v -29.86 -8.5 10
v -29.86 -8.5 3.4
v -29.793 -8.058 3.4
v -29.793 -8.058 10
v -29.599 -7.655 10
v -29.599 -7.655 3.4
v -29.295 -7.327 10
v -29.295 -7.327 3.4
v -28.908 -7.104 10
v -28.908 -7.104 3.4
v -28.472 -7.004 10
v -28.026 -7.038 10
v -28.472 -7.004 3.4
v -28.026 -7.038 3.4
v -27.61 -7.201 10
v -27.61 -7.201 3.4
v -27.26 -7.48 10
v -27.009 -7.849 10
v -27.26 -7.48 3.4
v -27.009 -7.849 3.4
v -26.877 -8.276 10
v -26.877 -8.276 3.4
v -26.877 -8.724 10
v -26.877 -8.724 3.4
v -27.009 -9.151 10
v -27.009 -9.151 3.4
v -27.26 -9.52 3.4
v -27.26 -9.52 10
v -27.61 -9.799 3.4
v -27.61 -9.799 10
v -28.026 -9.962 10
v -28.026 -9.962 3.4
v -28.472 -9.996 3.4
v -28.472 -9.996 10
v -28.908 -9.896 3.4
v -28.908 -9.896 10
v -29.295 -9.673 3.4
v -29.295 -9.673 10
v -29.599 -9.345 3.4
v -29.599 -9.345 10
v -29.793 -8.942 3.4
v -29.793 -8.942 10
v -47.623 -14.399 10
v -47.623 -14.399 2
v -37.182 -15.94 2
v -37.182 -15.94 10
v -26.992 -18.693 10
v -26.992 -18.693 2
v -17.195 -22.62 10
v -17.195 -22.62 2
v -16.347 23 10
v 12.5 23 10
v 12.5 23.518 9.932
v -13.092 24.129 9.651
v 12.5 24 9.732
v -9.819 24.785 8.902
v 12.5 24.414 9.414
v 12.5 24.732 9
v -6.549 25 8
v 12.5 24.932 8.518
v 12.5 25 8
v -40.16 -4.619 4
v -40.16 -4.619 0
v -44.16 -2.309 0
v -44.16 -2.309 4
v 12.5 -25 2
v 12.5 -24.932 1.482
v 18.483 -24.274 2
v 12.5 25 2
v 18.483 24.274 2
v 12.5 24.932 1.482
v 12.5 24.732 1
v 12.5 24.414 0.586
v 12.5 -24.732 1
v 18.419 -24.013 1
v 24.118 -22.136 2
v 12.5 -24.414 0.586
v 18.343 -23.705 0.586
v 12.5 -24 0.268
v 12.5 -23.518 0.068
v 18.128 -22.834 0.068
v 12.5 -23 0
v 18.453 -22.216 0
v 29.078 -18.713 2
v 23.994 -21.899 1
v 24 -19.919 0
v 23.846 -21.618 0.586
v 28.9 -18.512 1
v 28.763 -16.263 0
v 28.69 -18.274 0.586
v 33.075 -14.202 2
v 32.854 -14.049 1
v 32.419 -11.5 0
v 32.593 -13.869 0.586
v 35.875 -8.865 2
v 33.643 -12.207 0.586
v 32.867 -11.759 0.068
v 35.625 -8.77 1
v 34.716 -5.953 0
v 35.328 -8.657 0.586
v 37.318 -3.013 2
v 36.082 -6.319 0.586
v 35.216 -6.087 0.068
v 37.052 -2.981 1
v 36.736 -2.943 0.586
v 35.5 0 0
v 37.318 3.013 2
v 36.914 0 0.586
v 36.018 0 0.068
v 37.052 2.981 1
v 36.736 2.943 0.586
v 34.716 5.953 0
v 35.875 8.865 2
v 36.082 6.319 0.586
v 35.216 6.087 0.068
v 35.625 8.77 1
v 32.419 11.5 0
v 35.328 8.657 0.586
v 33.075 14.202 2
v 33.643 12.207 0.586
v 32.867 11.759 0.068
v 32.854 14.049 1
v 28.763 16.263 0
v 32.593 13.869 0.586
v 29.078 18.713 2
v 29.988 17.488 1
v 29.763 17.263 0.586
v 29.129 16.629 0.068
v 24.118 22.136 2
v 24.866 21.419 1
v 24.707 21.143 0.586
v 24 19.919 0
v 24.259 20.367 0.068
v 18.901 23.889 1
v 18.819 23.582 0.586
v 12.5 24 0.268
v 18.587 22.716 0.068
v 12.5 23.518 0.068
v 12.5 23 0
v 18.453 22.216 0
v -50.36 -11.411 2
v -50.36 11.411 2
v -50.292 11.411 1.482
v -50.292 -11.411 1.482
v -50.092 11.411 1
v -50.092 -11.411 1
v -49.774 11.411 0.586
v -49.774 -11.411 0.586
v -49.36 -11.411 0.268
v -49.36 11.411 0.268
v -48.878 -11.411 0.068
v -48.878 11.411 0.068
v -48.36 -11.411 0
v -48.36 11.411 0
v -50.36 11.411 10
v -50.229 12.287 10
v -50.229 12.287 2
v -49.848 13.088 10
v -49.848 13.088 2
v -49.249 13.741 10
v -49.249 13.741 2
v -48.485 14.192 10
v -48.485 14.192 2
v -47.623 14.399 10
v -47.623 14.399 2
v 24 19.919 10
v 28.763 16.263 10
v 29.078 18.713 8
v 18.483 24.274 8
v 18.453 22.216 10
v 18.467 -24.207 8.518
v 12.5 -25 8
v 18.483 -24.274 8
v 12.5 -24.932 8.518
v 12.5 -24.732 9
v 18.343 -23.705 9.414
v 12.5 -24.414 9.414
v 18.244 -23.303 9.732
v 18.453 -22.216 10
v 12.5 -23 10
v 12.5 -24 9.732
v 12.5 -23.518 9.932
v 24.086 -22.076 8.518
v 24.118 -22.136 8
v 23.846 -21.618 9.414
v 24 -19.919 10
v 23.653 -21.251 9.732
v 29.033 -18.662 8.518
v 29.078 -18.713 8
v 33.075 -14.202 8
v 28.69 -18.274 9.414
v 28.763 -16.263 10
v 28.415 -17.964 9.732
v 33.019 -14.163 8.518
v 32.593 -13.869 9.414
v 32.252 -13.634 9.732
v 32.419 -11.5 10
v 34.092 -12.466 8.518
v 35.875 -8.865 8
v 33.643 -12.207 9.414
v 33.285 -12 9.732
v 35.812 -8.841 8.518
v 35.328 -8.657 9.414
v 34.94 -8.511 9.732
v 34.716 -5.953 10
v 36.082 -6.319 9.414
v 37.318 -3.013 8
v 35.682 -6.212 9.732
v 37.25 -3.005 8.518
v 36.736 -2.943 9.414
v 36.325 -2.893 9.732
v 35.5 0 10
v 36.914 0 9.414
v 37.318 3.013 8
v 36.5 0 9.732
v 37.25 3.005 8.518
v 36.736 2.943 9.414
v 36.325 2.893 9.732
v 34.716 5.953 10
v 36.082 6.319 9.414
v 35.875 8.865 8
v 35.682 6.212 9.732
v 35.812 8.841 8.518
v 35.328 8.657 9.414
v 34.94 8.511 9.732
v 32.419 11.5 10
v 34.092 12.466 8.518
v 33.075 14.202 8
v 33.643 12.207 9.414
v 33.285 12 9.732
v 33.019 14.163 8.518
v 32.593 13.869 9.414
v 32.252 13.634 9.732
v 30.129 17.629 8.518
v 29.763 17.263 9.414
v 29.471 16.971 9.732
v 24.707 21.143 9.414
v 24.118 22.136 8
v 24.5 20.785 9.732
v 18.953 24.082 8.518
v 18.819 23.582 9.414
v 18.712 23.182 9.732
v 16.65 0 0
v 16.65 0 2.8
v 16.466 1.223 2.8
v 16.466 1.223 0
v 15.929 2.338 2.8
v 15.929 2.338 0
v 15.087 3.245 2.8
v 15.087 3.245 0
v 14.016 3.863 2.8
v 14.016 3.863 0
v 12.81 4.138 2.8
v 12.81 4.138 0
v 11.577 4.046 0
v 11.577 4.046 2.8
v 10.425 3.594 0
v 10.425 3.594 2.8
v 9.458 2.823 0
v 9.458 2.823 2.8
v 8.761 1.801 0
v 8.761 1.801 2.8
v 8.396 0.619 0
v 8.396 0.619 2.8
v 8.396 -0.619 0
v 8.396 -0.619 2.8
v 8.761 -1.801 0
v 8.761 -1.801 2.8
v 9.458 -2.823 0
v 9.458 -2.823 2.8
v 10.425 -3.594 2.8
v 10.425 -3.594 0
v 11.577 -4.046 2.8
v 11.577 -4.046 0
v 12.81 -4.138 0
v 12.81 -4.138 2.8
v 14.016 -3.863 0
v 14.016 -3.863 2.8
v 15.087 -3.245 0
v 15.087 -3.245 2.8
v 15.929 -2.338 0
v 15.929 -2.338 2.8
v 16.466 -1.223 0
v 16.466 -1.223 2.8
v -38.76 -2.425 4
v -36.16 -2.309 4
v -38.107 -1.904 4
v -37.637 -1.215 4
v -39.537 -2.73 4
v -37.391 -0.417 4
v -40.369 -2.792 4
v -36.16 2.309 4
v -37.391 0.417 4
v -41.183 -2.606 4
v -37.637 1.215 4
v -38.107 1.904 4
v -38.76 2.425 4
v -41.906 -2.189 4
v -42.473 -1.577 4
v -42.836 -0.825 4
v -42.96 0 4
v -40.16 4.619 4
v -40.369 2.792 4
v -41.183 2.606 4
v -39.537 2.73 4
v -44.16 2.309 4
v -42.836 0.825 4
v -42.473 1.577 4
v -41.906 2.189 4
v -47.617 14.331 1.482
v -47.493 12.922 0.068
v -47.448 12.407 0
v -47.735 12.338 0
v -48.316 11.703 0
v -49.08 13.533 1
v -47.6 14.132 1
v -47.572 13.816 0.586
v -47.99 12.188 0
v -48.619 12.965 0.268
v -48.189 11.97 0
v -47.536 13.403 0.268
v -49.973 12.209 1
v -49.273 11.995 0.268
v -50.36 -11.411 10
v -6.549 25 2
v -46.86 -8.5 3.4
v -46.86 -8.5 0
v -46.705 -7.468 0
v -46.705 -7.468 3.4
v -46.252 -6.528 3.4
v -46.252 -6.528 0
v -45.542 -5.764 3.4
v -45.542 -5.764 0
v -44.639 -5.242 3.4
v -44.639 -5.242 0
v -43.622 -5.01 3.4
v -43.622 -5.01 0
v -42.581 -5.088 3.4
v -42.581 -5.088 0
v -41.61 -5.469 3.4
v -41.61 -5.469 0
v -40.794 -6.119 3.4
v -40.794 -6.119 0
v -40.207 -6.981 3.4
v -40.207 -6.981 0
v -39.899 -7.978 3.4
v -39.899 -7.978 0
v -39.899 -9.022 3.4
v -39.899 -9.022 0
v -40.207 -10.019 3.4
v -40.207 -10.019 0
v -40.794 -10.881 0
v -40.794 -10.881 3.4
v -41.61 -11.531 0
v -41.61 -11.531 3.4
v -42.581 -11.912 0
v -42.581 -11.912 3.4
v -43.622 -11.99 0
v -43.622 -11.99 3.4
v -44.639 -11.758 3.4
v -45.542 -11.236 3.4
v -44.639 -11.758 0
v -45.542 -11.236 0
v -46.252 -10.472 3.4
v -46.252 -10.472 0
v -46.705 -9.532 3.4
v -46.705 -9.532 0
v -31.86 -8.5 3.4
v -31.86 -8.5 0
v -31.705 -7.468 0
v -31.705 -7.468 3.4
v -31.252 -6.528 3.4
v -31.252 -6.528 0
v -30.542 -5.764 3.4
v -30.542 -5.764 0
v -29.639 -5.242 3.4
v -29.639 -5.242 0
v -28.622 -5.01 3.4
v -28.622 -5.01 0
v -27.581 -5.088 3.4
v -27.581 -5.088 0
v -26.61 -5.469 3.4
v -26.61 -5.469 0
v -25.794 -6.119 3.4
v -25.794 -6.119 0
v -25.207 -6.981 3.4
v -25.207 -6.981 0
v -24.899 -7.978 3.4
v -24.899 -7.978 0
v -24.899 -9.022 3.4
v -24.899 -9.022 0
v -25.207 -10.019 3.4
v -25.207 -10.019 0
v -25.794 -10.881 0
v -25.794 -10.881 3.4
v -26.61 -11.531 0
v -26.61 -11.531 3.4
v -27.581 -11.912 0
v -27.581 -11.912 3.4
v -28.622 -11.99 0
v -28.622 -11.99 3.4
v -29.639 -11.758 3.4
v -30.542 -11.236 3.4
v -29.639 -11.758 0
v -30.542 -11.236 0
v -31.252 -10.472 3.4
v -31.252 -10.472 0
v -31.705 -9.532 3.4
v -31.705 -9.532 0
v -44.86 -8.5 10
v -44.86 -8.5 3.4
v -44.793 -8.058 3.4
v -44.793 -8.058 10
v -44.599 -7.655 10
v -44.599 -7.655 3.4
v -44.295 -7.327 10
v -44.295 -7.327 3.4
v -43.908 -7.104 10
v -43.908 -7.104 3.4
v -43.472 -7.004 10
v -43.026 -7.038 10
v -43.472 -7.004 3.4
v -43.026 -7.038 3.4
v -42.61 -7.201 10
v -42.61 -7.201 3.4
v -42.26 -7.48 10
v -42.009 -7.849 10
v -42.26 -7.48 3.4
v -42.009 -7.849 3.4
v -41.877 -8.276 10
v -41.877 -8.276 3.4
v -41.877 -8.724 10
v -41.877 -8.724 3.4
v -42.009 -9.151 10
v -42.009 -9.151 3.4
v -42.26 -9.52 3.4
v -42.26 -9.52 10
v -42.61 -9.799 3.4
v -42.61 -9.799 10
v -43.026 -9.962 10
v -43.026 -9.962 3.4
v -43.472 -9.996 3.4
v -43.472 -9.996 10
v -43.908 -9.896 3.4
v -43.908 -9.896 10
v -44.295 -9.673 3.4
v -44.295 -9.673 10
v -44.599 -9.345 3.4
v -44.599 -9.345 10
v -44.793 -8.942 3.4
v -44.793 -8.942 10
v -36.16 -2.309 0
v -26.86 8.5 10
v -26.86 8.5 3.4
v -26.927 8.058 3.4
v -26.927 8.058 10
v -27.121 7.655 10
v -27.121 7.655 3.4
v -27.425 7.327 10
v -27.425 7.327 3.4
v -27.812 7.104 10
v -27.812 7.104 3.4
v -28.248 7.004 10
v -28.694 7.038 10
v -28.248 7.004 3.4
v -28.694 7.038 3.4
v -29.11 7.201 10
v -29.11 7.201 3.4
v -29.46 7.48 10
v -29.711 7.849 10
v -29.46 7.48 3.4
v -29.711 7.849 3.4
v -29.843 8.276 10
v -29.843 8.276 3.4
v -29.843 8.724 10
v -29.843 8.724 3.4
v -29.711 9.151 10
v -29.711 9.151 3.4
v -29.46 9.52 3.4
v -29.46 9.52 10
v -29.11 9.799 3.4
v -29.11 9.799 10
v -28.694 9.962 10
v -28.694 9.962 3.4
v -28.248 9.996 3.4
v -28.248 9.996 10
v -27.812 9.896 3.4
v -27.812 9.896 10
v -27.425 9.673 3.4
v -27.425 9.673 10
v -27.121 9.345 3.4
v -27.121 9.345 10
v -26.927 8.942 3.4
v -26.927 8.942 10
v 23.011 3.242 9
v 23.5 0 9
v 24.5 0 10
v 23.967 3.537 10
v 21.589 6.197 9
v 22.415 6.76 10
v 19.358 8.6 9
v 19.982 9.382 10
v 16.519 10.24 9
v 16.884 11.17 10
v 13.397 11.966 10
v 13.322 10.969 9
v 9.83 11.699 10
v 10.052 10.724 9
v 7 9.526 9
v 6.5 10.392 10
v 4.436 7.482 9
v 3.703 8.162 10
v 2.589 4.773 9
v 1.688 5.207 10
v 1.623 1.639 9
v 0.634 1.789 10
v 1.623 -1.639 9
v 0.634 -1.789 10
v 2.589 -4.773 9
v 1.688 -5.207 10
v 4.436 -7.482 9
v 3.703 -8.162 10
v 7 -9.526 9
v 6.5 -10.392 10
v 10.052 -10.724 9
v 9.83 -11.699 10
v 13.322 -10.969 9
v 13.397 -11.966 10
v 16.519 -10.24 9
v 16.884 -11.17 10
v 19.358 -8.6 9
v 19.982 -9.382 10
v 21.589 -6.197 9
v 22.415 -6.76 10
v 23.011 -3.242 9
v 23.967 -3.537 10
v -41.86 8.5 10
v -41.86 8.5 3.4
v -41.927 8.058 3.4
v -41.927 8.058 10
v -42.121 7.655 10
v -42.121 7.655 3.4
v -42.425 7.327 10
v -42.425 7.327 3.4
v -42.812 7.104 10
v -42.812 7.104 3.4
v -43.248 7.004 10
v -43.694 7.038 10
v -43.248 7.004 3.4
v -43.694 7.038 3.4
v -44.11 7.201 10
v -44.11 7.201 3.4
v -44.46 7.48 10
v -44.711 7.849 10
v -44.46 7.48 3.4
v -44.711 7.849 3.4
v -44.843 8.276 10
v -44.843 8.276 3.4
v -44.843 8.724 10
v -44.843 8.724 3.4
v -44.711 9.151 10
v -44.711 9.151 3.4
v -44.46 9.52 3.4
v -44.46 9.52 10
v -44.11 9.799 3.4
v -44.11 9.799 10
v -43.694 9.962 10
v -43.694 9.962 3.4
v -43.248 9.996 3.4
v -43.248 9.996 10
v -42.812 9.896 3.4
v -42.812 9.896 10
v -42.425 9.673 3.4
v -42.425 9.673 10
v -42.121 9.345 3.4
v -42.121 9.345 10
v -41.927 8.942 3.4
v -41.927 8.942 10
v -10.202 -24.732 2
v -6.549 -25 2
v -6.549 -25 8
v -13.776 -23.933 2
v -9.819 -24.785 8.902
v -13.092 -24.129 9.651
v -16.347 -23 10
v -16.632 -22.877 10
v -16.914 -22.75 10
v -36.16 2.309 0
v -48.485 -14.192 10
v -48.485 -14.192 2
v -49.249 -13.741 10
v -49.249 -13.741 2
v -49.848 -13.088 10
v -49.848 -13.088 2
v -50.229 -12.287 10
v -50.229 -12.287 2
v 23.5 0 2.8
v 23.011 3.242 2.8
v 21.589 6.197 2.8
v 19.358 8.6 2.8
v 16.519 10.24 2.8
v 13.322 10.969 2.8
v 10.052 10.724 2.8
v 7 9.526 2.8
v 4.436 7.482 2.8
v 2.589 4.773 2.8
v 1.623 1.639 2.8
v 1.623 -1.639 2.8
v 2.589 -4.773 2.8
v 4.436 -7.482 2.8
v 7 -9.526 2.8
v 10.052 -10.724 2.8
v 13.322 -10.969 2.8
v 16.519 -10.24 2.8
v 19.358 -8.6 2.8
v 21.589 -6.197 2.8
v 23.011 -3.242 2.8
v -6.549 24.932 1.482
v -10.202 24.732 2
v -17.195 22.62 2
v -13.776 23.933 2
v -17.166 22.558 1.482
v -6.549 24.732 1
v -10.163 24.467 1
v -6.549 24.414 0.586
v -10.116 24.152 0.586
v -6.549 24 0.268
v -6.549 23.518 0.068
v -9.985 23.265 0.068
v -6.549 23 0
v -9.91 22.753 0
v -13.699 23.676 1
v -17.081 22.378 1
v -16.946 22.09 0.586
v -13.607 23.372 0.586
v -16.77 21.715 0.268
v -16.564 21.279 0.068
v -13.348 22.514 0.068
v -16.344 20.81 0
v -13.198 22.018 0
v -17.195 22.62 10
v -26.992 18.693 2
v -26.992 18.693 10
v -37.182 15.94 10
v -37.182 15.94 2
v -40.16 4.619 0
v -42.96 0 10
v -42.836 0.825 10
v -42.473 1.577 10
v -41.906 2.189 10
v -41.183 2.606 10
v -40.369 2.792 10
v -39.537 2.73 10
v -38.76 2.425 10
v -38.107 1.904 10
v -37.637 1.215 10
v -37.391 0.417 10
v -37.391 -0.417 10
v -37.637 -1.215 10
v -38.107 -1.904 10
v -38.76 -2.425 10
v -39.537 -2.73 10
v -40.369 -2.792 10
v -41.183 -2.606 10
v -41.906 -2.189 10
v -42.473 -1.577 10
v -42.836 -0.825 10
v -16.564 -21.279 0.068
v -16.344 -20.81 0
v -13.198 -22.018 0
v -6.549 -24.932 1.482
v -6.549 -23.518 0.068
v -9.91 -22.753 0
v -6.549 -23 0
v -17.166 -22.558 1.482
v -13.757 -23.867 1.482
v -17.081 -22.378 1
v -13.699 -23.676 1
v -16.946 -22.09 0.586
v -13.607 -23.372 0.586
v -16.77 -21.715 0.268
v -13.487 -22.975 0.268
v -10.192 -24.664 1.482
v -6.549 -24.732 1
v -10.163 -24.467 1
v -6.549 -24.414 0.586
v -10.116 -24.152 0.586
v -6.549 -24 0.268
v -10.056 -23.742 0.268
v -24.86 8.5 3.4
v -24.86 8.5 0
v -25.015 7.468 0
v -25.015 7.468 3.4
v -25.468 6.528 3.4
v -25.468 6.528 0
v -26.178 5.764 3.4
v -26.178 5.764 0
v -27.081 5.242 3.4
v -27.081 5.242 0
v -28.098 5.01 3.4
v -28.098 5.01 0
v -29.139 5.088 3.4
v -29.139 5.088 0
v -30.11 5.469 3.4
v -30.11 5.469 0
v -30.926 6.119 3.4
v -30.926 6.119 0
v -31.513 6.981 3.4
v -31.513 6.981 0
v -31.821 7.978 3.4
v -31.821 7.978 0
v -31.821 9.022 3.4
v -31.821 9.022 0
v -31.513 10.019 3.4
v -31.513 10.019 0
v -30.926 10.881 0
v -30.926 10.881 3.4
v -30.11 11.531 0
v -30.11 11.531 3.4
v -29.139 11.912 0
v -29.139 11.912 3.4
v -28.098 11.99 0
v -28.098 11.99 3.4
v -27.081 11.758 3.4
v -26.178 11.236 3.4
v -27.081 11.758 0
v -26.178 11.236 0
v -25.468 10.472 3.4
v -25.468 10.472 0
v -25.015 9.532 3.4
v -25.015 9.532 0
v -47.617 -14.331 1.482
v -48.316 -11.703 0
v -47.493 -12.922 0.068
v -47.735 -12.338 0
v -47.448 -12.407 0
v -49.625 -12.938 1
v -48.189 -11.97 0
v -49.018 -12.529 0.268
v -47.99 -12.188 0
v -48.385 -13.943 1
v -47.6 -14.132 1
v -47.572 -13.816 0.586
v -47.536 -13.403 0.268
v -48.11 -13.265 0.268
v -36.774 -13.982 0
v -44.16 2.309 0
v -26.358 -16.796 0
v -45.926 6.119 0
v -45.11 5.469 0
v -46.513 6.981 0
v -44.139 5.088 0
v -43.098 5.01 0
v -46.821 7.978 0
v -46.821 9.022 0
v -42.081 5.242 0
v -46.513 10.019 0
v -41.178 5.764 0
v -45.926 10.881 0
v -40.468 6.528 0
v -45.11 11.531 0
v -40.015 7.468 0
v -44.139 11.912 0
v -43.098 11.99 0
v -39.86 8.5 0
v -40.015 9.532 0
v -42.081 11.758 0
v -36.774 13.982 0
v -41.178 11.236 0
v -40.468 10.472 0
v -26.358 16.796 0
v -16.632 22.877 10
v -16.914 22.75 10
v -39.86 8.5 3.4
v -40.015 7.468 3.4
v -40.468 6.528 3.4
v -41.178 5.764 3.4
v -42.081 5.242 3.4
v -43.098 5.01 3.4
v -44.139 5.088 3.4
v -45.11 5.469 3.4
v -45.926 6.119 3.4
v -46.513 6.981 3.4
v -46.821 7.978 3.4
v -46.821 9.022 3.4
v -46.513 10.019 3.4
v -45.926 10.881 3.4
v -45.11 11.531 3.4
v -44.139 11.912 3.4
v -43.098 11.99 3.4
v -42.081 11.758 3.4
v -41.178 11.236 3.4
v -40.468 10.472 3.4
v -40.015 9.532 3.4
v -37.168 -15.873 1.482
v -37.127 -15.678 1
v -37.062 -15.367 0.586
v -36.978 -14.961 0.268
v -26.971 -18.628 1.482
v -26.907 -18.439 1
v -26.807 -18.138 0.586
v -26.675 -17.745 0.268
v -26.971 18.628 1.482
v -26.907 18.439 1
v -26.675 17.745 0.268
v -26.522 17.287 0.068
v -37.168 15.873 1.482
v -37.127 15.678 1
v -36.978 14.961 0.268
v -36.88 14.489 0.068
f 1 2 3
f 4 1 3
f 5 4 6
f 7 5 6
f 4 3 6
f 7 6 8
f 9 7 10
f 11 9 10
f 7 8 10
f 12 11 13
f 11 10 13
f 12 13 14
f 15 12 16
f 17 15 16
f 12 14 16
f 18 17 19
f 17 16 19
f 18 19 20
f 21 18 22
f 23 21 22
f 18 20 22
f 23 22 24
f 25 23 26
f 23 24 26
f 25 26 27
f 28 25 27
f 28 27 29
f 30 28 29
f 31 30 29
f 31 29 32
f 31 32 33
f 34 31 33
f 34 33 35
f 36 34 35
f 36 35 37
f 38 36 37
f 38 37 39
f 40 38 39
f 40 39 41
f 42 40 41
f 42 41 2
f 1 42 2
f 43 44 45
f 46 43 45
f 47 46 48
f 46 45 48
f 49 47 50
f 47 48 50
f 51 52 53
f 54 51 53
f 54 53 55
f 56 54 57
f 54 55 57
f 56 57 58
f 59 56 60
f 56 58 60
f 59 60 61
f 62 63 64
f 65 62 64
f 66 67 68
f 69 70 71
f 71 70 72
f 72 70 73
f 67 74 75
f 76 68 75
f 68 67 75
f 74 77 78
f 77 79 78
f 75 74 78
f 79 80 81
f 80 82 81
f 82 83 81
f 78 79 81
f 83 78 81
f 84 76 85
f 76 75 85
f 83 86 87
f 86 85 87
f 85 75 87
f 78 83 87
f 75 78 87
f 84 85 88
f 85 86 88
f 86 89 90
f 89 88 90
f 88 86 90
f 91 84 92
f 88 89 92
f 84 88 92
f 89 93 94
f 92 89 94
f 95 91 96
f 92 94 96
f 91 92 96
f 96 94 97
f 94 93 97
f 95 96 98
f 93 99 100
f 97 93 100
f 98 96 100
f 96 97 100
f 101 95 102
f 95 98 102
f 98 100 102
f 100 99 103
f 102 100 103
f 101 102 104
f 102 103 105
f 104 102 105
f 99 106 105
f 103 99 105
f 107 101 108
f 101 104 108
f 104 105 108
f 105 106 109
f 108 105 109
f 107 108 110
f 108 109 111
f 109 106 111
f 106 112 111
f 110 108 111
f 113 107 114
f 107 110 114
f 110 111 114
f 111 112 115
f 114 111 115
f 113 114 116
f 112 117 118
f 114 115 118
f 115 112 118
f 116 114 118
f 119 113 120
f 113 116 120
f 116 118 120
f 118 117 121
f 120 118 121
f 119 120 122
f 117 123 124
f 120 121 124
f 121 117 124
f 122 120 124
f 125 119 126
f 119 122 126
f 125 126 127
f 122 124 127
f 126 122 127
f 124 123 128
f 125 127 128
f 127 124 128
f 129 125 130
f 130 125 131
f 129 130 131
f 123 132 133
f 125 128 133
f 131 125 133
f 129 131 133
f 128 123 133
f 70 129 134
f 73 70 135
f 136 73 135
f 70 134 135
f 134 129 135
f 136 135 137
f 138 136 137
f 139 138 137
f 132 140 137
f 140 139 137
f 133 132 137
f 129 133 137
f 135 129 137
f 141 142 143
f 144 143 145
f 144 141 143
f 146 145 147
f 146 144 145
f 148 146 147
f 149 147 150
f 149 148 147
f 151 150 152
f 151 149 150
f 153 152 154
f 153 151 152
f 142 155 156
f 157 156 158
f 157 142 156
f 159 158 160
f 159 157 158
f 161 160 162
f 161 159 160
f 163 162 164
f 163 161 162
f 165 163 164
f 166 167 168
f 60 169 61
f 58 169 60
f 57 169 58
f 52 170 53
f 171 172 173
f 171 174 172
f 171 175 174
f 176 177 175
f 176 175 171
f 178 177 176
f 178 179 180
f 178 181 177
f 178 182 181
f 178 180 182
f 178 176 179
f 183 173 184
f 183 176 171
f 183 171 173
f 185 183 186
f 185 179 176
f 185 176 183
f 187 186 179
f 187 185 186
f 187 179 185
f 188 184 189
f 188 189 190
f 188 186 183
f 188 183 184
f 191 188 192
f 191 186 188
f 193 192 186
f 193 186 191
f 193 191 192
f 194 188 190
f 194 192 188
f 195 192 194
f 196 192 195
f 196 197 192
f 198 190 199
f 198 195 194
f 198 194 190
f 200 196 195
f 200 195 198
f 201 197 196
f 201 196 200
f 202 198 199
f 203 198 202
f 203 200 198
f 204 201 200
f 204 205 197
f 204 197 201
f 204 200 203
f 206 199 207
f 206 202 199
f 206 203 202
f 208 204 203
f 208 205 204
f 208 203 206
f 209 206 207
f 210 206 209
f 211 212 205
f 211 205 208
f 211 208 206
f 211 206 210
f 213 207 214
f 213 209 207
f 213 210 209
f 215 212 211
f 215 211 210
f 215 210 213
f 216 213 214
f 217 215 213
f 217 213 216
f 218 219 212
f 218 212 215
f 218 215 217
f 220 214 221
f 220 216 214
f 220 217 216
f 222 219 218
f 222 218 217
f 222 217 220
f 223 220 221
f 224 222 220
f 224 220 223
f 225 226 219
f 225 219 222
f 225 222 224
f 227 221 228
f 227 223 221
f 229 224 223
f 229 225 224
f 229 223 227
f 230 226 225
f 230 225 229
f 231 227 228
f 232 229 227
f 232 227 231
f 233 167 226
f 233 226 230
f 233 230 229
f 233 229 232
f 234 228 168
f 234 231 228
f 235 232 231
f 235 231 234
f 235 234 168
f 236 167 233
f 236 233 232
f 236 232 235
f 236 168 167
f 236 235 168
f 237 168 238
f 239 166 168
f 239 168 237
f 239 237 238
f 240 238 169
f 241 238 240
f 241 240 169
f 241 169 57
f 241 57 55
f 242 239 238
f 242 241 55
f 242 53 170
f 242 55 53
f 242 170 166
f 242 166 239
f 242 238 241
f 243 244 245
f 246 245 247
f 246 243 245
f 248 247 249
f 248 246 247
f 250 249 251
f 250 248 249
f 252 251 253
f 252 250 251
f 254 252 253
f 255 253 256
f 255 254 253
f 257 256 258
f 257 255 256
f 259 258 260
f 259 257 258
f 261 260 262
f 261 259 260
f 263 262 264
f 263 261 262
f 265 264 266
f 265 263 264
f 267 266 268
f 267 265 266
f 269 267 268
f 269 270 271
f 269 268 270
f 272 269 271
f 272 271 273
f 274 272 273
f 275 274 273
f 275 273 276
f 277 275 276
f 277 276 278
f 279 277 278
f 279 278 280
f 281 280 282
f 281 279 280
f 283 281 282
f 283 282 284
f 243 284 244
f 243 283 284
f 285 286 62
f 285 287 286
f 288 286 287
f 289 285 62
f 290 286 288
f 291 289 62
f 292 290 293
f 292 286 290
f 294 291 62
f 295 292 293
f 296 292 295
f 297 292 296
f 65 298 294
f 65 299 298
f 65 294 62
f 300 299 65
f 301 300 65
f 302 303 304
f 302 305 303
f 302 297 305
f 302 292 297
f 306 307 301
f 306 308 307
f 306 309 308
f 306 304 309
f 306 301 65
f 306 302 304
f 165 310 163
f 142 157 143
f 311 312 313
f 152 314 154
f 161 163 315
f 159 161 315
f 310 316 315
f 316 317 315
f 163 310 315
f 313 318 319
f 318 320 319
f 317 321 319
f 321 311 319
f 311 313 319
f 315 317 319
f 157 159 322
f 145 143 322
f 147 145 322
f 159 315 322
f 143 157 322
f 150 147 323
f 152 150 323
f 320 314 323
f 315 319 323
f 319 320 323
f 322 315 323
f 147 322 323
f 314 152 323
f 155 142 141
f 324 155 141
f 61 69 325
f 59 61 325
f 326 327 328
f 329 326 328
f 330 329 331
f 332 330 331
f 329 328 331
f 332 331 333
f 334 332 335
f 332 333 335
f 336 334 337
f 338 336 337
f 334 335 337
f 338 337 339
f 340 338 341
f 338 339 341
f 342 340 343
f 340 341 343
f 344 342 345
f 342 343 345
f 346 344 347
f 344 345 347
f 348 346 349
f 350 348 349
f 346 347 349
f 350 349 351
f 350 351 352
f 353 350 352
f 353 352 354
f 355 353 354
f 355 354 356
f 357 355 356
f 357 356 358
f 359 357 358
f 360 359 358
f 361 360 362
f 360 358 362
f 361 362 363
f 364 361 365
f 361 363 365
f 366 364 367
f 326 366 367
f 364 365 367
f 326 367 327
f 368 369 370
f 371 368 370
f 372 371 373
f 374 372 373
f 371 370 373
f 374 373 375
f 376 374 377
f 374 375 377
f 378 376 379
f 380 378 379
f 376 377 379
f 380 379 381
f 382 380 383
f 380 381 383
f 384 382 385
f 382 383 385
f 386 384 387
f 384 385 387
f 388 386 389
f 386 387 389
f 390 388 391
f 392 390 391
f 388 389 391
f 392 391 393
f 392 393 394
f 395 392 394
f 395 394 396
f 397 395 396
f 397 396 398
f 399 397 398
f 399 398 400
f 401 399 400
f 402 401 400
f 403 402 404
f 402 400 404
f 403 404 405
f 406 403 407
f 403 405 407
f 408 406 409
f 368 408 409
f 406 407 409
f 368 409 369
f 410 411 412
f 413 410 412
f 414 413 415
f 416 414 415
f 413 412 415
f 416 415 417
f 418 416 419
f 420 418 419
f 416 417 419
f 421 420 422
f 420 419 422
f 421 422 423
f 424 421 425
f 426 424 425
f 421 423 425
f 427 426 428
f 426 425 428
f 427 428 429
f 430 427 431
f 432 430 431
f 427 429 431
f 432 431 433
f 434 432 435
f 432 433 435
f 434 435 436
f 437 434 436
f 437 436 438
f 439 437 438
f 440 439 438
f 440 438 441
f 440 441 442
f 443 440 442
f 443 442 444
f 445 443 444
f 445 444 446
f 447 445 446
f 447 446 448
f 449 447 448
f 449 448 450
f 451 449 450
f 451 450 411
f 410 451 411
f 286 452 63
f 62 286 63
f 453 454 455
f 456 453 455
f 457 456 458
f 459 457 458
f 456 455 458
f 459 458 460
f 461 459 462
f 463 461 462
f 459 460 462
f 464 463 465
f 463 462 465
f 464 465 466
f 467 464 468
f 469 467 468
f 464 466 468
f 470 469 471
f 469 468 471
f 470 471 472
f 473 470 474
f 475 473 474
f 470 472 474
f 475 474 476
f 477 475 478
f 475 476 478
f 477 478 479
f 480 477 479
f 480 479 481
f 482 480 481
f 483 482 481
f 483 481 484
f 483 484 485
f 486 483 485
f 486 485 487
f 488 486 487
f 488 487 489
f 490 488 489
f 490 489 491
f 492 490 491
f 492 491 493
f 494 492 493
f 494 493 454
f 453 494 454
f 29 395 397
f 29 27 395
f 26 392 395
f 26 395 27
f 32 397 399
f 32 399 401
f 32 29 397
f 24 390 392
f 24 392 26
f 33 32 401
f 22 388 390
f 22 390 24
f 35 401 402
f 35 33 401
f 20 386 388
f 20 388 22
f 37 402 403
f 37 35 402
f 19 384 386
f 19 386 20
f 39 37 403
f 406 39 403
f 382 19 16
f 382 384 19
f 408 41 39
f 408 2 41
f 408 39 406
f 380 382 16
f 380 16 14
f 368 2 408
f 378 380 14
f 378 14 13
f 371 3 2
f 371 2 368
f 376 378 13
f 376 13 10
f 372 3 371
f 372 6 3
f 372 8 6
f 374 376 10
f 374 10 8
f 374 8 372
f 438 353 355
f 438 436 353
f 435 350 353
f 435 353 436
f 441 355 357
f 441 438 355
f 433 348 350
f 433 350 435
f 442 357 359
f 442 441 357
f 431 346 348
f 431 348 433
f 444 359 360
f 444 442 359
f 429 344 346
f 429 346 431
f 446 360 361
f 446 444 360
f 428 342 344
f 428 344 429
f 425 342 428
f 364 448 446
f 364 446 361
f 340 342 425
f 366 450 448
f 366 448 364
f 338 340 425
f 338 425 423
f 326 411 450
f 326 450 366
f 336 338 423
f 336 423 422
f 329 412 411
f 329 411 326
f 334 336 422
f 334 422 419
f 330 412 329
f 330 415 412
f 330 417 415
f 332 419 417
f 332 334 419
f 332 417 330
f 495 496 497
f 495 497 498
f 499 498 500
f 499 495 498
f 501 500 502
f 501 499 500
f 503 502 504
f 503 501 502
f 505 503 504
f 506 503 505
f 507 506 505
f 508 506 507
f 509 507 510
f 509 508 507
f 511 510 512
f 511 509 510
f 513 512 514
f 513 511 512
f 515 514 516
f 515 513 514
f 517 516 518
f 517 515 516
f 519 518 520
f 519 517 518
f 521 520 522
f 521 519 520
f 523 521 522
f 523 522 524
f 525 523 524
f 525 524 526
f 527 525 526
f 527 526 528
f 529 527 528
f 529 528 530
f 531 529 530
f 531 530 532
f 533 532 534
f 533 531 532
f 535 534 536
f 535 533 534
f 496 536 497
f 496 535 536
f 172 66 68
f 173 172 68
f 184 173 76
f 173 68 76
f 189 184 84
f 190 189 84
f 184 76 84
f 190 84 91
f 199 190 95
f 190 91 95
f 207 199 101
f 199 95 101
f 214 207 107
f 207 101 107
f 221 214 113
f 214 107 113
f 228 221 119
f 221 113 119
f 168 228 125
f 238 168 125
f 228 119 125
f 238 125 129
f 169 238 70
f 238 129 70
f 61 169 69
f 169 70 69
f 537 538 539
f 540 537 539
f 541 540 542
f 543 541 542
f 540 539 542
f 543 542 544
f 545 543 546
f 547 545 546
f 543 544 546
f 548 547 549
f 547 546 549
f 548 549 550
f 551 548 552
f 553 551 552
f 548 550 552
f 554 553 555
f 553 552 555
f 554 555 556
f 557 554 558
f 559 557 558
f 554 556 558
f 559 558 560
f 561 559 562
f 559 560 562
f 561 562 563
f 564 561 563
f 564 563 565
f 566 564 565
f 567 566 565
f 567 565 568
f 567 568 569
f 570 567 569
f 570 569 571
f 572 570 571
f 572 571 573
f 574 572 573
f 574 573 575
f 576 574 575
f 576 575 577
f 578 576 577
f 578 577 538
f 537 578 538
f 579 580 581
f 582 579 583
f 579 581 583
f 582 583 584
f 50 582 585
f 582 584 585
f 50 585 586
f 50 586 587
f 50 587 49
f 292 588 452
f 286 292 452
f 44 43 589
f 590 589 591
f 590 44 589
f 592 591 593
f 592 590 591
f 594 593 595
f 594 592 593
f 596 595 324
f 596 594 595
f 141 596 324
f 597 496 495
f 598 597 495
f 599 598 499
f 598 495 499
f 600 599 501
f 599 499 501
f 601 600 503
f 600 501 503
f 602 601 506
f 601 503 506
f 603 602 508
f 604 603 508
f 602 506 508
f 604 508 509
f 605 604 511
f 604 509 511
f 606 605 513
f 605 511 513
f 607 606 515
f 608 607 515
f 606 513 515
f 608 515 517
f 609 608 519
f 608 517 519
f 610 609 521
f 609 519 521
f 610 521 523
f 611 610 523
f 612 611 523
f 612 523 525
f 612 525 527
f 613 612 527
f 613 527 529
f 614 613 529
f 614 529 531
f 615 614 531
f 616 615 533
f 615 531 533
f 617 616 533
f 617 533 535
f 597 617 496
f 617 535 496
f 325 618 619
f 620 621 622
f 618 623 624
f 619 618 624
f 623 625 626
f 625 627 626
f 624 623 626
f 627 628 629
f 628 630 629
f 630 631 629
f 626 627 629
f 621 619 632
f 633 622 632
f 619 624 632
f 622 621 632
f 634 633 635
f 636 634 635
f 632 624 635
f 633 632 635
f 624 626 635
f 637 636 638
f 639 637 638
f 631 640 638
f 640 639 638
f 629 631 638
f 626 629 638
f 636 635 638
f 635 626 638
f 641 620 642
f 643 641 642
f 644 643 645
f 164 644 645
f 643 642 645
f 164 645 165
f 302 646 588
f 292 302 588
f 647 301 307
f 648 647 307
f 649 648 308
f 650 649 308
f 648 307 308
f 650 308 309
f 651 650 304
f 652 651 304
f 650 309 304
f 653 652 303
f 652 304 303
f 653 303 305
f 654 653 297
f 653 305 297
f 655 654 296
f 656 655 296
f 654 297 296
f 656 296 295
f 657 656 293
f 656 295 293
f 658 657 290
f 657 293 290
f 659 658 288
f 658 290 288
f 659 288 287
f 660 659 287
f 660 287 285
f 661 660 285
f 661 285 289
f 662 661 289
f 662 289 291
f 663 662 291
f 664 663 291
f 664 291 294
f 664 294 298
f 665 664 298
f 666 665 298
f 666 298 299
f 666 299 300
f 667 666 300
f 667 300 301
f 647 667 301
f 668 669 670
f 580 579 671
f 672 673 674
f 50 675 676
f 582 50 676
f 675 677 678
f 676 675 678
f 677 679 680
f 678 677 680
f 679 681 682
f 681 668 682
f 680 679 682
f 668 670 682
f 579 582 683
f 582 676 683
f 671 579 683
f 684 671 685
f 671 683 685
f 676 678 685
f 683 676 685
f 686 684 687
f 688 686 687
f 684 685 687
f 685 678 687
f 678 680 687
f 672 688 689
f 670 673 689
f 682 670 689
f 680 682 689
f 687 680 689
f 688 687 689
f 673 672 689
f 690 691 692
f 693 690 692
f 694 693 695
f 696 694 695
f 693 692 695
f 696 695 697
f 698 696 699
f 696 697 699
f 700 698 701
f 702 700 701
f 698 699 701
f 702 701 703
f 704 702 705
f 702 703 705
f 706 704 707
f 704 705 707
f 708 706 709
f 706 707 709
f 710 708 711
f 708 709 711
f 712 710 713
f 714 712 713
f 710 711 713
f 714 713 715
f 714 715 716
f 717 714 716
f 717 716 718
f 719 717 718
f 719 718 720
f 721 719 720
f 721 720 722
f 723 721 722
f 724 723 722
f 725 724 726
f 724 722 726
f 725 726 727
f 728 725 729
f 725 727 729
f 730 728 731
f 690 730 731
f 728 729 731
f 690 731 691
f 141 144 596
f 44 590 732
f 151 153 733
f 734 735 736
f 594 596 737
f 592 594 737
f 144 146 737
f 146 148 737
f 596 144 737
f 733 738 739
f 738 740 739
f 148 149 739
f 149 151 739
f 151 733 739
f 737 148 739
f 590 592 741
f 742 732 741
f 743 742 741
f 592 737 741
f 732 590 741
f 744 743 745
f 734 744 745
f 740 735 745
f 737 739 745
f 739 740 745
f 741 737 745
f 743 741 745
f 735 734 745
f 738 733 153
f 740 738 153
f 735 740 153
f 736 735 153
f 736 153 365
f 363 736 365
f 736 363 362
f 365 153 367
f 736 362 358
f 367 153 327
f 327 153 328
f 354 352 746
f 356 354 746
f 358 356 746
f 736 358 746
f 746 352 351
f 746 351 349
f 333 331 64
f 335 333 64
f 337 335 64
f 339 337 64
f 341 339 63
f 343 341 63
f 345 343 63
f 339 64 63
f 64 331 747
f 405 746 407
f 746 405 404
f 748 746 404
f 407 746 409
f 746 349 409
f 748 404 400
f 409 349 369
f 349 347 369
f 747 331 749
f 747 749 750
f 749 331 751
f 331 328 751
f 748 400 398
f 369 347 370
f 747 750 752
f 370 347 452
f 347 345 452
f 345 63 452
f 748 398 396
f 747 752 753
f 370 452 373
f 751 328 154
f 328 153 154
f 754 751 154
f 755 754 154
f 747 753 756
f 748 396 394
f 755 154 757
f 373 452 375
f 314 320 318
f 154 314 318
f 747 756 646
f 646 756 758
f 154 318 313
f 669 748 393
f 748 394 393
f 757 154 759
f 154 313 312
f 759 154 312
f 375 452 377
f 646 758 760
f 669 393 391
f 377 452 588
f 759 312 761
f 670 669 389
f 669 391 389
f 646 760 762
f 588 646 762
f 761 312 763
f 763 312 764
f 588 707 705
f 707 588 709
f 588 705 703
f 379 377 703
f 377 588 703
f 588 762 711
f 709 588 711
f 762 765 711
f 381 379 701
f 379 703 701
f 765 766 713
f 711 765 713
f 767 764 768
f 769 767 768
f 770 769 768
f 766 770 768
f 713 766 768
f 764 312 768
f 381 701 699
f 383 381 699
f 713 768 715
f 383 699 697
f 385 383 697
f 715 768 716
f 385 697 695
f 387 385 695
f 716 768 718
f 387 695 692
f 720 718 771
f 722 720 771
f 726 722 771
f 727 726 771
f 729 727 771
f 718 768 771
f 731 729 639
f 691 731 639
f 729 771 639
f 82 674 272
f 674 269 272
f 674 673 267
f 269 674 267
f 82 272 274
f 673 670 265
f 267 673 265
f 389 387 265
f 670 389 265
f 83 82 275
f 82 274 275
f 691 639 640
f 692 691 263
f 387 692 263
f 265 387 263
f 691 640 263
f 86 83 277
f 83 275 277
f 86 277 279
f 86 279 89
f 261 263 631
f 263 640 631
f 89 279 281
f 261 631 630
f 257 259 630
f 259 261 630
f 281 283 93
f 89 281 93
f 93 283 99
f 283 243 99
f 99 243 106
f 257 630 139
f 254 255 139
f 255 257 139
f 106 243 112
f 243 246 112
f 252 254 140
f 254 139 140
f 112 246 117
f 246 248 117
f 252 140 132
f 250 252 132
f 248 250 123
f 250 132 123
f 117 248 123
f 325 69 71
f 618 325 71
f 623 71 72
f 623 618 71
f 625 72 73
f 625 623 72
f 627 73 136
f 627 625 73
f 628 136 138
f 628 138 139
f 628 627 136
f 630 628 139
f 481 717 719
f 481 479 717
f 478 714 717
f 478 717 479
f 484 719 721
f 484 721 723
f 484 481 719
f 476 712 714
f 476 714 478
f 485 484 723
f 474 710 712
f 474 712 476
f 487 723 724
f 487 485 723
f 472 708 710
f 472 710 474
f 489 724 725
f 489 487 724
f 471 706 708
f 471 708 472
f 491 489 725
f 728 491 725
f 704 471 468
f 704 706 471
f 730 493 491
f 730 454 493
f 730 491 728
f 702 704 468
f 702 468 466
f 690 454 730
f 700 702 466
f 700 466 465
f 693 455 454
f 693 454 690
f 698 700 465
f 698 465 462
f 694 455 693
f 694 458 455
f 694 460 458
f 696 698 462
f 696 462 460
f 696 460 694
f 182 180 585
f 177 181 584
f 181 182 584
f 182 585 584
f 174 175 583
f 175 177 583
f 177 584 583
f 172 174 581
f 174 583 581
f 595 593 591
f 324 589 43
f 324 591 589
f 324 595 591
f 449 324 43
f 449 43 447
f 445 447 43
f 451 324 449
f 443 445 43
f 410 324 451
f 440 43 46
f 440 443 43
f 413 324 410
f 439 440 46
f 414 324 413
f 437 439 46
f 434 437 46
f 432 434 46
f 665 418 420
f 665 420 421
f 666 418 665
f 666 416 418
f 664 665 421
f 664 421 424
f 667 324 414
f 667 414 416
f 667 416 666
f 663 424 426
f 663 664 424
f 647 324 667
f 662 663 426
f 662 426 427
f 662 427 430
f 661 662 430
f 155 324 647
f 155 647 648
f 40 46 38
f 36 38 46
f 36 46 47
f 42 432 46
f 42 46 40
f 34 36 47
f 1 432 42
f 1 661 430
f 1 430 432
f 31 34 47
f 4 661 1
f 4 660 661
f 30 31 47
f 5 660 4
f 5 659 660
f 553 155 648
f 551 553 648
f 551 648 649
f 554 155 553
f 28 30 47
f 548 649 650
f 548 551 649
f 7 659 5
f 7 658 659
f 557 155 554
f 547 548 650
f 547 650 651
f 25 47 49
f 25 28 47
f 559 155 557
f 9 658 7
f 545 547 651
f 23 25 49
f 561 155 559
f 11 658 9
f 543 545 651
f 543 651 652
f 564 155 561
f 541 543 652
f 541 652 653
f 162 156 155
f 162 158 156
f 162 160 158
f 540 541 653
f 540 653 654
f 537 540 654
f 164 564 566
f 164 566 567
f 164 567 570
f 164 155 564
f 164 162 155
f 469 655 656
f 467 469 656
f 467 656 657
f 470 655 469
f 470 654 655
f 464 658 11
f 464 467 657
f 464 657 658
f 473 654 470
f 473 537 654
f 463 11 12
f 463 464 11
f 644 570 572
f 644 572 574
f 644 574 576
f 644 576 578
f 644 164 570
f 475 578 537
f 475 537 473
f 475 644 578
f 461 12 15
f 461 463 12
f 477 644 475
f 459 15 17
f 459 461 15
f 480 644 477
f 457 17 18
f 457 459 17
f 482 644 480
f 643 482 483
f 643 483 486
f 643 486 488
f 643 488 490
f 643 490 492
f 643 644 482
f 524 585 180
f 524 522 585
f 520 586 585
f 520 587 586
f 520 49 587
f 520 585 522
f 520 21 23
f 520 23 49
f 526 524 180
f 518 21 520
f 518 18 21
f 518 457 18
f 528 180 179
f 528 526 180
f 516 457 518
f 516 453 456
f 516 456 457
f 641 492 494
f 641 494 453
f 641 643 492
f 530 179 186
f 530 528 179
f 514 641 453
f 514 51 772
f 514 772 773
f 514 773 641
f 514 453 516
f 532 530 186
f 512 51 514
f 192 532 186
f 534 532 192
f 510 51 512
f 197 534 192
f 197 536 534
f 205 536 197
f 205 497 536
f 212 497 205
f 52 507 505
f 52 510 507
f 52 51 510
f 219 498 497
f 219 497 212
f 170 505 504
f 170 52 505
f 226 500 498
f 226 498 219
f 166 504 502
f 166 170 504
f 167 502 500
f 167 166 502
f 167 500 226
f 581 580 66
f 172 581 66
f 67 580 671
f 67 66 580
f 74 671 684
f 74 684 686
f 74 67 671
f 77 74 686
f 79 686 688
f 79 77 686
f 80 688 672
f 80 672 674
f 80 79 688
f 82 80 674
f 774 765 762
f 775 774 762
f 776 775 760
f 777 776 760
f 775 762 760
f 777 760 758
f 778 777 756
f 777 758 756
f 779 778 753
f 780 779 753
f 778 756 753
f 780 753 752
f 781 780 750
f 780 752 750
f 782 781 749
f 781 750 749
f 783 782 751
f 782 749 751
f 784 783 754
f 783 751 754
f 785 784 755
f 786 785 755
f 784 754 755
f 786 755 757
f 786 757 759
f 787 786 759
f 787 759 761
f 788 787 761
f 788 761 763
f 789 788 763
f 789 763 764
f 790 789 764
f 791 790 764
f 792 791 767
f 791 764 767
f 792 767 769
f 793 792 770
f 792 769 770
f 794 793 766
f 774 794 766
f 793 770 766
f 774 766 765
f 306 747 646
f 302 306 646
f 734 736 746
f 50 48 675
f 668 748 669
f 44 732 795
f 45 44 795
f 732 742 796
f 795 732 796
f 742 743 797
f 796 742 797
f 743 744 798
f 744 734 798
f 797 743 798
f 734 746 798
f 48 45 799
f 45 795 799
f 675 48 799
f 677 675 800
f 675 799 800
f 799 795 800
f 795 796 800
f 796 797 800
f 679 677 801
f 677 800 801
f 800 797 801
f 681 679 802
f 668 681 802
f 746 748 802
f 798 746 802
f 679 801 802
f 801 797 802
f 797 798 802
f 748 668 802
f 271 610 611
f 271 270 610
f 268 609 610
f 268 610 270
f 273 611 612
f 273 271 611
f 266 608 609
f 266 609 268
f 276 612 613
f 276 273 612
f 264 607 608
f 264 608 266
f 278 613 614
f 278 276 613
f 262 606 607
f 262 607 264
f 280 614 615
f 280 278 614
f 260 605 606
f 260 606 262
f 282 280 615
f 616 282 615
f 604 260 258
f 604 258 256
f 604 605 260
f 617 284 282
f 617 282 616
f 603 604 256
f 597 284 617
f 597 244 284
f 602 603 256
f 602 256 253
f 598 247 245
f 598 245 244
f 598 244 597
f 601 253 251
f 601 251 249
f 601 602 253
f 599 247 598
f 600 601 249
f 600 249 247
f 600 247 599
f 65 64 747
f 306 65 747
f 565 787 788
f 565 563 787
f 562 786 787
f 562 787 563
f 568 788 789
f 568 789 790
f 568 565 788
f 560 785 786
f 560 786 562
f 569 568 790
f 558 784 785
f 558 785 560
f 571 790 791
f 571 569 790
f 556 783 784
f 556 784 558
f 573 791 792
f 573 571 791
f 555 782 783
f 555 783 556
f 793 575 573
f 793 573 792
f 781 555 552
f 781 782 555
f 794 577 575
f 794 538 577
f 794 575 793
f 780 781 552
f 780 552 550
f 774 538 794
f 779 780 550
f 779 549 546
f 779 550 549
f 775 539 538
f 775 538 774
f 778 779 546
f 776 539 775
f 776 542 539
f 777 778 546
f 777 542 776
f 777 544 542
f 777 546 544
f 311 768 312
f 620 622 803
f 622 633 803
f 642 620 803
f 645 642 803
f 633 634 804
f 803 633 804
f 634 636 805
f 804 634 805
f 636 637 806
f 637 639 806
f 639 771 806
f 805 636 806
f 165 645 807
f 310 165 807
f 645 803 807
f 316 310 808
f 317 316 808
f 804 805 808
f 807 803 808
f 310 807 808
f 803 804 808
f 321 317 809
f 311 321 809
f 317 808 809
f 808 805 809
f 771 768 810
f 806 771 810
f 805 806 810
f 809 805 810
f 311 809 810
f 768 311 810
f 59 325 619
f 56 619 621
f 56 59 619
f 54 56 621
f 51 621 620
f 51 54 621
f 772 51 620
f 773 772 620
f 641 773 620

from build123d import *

# Parameters (mm, degrees)
SKETCH1_R           = 4.15
BOSS_EXTRUDE1_DEPTH = 10
SKETCH4_R           = 11
CUT_EXTRUDE2_DEPTH  = 7.2
CHAMFER1_SIZE       = 1
FILLET2_R           = 25
FILLET3_R           = 2
FILLET4_R           = 2
FILLET5_DEPTH       = 11
FILLET5_2_ANGLE     = 84.965742
FILLET5_3_ANGLE     = 84.965742
SKETCH5_R           = 2.8
CUT_EXTRUDE3_DEPTH  = 58.10630094
CUT_EXTRUDE5_DEPTH  = 4
SKETCH8_R           = 1.5
CUT_EXTRUDE6_DEPTH  = 58.10630094
SKETCH9_R           = 3.5
CUT_EXTRUDE7_DEPTH  = 3.4


with BuildPart() as part:
    # Sketch1 → Boss-Extrude1 (new body)
    with BuildSketch(Plane.XY):
        with BuildLine():
            Line((12.5, 25), (-12.5, 25))
            ThreePointArc((-12.5, 25), (-30.832208454, 17.504408525), (-50.36, 14.2))
            Line((-50.36, 14.2), (-50.36, -14.2))
            ThreePointArc((-50.36, -14.2), (-30.832208454, -17.504408525), (-12.5, -25))
            Line((-12.5, -25), (12.5, -25))
            ThreePointArc((12.5, -25), (37.5, 0), (12.5, 25))
        make_face()
        with Locations((12.5, 0)):
            Circle(SKETCH1_R, mode=Mode.SUBTRACT)
    extrude(amount=BOSS_EXTRUDE1_DEPTH)

    # Sketch4 → Cut-Extrude2 (cut)
    with BuildSketch(Plane.XY.offset(10)):
        with Locations((12.5, 0)):
            Circle(SKETCH4_R)
    extrude(amount=-CUT_EXTRUDE2_DEPTH, mode=Mode.SUBTRACT)

    # Chamfer1
    chamfer1_edges = [part.edges().sort_by_distance(p)[0] for p in [
        (1.5, 0, 10),
    ]]
    chamfer(chamfer1_edges, length=CHAMFER1_SIZE)

    # Fillet2
    fillet2_edges = [part.edges().sort_by_distance(p)[0] for p in [
        (-12.5, 25, 5),
        (-12.5, -25, 5),
    ]]
    fillet(fillet2_edges, radius=FILLET2_R)

    # Fillet3
    fillet3_edges = [part.edges().sort_by_distance(p)[0] for p in [
        (-33.37388042, 16.819399365, 0),
        (2.975273986, -25, 0),
        (-12.003831035, -24.397740667, 0),
        (-12.003831035, 24.397740667, 0),
        (-50.36, 0, 0),
        (2.975273986, 25, 0),
        (37.5, 0, 0),
        (-33.37388042, -16.819399365, 0),
    ]]
    fillet(fillet3_edges, radius=FILLET3_R)

    # Fillet4
    # the kernel refuses this fillet: 2 mm, written as the material it takes off along each edge
    with BuildSketch(Plane(origin=(12.5, 0, 10), x_dir=(0, -1, 0), z_dir=(-1, 0, 0))) as fillet4_piece_1:
        with BuildLine():
            CenterArc((25 - FILLET4_R, -FILLET4_R), FILLET4_R, 0, 90)
            Line((25, -FILLET4_R), (25, 0))
            Line((25, 0), (25 - FILLET4_R, 0))
        make_face()
    revolve(axis=Axis((12.5, 0, 10), (0, 0, 1)), revolution_arc=180, mode=Mode.SUBTRACT)
    with BuildSketch(Plane(origin=(12.5, 25, 10), x_dir=(0, -1, 0), z_dir=(-1, 0, 0))) as fillet4_piece_2:
        with BuildLine():
            CenterArc((FILLET4_R, -FILLET4_R), FILLET4_R, 90, 90)
            Line((0, -FILLET4_R), (0, 0))
            Line((0, 0), (FILLET4_R, 0))
        make_face()
    extrude(amount=34.049452029, mode=Mode.SUBTRACT)
    with BuildSketch(Plane(origin=(-21.549452029, -25, 10), x_dir=(0, 0, -1), z_dir=(1, 0, 0))) as fillet4_piece_3:
        with BuildLine():
            CenterArc((FILLET4_R, FILLET4_R), FILLET4_R, 180, 90)
            Line((0, FILLET4_R), (0, 0))
            Line((0, 0), (FILLET4_R, 0))
        make_face()
    extrude(amount=34.049452029, mode=Mode.SUBTRACT)

    # Fillet5: read off the stored shape, not the designer's step
    # Fillet5 outline → Fillet5 (cut)
    with BuildSketch(Plane.XY):
        with BuildLine():
            Line((-50.36, 14.2), (-50.36, 11.410663893))
            ThreePointArc((-50.36, 11.410663893), (-49.572437829, 13.436773182), (-47.623254098, 14.399091118))
            ThreePointArc((-47.623254098, 14.399091118), (-48.990868253, 14.289114994), (-50.36, 14.2))
        make_face()
        with BuildLine():
            ThreePointArc((-47.623254098, -14.399091118), (-49.572437829, -13.436773182), (-50.36, -11.410663893))
            Line((-50.36, -11.410663893), (-50.36, -14.2))
            ThreePointArc((-50.36, -14.2), (-48.990868253, -14.289114994), (-47.623254098, -14.399091118))
        make_face()
    extrude(amount=FILLET5_DEPTH, mode=Mode.SUBTRACT)

    # Fillet5 2 outline → Fillet5 2 (revolve, cut)
    with BuildSketch(Plane(origin=(-47.36, 11.410663893, 0), x_dir=(-0.08775136609960318, 0.9961424083672241, 0), z_dir=(0.9961424083672241, 0.08775136609960318, 0))):
        with BuildLine():
            ThreePointArc((3, 2), (2.414213562, 0.585786438), (1, 0))
            Line((1, 0), (3, 0))
            Line((3, 0), (3, 2))
        make_face()
    revolve(axis=Axis((-47.36, 11.410663893, 0), (0, 0, 1)), revolution_arc=FILLET5_2_ANGLE, mode=Mode.SUBTRACT)

    # Fillet5 3 outline → Fillet5 3 (revolve, cut)
    with BuildSketch(Plane(origin=(-47.36, -11.410663893, 0), x_dir=(-1, 0, 0), z_dir=(0, 1, 0))):
        with BuildLine():
            ThreePointArc((3, 2), (2.414213562, 0.585786438), (1, 0))
            Line((1, 0), (3, 0))
            Line((3, 0), (3, 2))
        make_face()
    revolve(axis=Axis((-47.36, -11.410663893, 0), (0, 0, 1)), revolution_arc=FILLET5_3_ANGLE, mode=Mode.SUBTRACT)

    # Sketch5 → Cut-Extrude3 (cut, through all)
    with BuildSketch(Plane(origin=(0, 0, 0), x_dir=(-1, 0, 0), z_dir=(0, 0, -1))):
        with Locations((40.16, 0)):
            Circle(SKETCH5_R)
    extrude(amount=-CUT_EXTRUDE3_DEPTH, mode=Mode.SUBTRACT)

    # Sketch7 → Cut-Extrude5 (cut)
    with BuildSketch(Plane(origin=(0, 0, 0), x_dir=(-1, 0, 0), z_dir=(0, 0, -1))):
        Polygon((36.16, -2.309401077), (40.16, -4.618802154), (44.16, -2.309401077), (44.16, 2.309401077), (40.16, 4.618802154), (36.16, 2.309401077), align=None)
    extrude(amount=-CUT_EXTRUDE5_DEPTH, mode=Mode.SUBTRACT)

    # Sketch8 → Cut-Extrude6 (cut, through all)
    with BuildSketch(Plane(origin=(0, 0, 0), x_dir=(-1, 0, 0), z_dir=(0, 0, -1))):
        with Locations((43.36, -8.5)):
            Circle(SKETCH8_R)
        with Locations((28.36, -8.5)):
            Circle(SKETCH8_R)
        with Locations(Location((28.36, 8.5, 0), (0, 0, 180))):
            Circle(SKETCH8_R)
        with Locations(Location((43.36, 8.5, 0), (0, 0, 180))):
            Circle(SKETCH8_R)
    extrude(amount=-CUT_EXTRUDE6_DEPTH, mode=Mode.SUBTRACT)

    # Sketch9 → Cut-Extrude7 (cut)
    with BuildSketch(Plane(origin=(0, 0, 0), x_dir=(-1, 0, 0), z_dir=(0, 0, -1))):
        with Locations((43.36, -8.5)):
            Circle(SKETCH9_R)
        with Locations((28.36, -8.5)):
            Circle(SKETCH9_R)
        with Locations(Location((28.36, 8.5, 0), (0, 0, 180))):
            Circle(SKETCH9_R)
        with Locations(Location((43.36, 8.5, 0), (0, 0, 180))):
            Circle(SKETCH9_R)
    extrude(amount=-CUT_EXTRUDE7_DEPTH, mode=Mode.SUBTRACT)


solid = part.part
